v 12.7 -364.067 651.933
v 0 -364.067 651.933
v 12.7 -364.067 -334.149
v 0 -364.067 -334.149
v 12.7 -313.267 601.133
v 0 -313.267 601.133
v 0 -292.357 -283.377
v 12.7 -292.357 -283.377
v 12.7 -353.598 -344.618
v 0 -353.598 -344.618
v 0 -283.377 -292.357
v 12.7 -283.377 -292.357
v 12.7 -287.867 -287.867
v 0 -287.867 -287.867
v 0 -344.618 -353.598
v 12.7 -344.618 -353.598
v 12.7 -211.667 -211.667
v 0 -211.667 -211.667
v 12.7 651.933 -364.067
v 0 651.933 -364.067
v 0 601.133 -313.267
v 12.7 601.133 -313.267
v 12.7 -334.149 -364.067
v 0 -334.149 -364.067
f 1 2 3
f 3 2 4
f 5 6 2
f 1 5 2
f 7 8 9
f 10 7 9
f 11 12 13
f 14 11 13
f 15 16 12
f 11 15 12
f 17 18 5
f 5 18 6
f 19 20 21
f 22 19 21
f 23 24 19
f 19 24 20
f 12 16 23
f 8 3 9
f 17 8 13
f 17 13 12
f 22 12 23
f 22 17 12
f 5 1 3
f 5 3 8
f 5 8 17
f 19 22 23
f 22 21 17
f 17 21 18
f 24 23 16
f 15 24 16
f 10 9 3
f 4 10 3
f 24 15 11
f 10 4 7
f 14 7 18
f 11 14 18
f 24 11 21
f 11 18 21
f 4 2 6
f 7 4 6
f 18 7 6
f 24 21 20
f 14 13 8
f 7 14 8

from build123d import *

# Parameters (mm, degrees)
F1_DEPTH = 12.7
F3_DEPTH = 12.701
F5_DEPTH = 12.701


# Not quite as in the source:
# - a length typed as a fraction of an inch, garbled in the dataset ("3 / 203.2 mm" for 3/8 in), is restored


with BuildPart() as f1:
    # F0 (on Right) → F1 (new body)
    with BuildSketch(Plane.YZ):
        Polygon((-313.2666666667, 601.1333333333), (-364.0666666667, 651.9333333333), (-364.0666666667, -364.0666666667), (651.9333333333, -364.0666666667), (601.1333333333, -313.2666666667), (-211.6666666667, -211.6666666667), align=None)
    extrude(amount=F1_DEPTH)

    # F2 (on face) → F3 (cut, through all)
    with BuildSketch(Plane.YZ.offset(12.7)):
        Polygon((-283.3765386061, -292.3567947272), (-287.8666666667, -287.8666666667), (-292.3567947272, -283.3765386061), (-364.0666666667, -355.0864105456), (-364.0666666667, -364.0666666667), (-355.0864105456, -364.0666666667), align=None)
    extrude(amount=-F3_DEPTH, mode=Mode.SUBTRACT)

    # F4 (on face) → F5 (cut, through all)
    with BuildSketch(Plane.YZ.offset(12.7)):
        Polygon((-334.1487050056, -364.0666666667), (-364.0666666667, -334.1487050056), (-364.0666666667, -355.0864105456), (-355.0864105456, -364.0666666667), align=None)
    extrude(amount=-F5_DEPTH, mode=Mode.SUBTRACT)


solid = f1.part
